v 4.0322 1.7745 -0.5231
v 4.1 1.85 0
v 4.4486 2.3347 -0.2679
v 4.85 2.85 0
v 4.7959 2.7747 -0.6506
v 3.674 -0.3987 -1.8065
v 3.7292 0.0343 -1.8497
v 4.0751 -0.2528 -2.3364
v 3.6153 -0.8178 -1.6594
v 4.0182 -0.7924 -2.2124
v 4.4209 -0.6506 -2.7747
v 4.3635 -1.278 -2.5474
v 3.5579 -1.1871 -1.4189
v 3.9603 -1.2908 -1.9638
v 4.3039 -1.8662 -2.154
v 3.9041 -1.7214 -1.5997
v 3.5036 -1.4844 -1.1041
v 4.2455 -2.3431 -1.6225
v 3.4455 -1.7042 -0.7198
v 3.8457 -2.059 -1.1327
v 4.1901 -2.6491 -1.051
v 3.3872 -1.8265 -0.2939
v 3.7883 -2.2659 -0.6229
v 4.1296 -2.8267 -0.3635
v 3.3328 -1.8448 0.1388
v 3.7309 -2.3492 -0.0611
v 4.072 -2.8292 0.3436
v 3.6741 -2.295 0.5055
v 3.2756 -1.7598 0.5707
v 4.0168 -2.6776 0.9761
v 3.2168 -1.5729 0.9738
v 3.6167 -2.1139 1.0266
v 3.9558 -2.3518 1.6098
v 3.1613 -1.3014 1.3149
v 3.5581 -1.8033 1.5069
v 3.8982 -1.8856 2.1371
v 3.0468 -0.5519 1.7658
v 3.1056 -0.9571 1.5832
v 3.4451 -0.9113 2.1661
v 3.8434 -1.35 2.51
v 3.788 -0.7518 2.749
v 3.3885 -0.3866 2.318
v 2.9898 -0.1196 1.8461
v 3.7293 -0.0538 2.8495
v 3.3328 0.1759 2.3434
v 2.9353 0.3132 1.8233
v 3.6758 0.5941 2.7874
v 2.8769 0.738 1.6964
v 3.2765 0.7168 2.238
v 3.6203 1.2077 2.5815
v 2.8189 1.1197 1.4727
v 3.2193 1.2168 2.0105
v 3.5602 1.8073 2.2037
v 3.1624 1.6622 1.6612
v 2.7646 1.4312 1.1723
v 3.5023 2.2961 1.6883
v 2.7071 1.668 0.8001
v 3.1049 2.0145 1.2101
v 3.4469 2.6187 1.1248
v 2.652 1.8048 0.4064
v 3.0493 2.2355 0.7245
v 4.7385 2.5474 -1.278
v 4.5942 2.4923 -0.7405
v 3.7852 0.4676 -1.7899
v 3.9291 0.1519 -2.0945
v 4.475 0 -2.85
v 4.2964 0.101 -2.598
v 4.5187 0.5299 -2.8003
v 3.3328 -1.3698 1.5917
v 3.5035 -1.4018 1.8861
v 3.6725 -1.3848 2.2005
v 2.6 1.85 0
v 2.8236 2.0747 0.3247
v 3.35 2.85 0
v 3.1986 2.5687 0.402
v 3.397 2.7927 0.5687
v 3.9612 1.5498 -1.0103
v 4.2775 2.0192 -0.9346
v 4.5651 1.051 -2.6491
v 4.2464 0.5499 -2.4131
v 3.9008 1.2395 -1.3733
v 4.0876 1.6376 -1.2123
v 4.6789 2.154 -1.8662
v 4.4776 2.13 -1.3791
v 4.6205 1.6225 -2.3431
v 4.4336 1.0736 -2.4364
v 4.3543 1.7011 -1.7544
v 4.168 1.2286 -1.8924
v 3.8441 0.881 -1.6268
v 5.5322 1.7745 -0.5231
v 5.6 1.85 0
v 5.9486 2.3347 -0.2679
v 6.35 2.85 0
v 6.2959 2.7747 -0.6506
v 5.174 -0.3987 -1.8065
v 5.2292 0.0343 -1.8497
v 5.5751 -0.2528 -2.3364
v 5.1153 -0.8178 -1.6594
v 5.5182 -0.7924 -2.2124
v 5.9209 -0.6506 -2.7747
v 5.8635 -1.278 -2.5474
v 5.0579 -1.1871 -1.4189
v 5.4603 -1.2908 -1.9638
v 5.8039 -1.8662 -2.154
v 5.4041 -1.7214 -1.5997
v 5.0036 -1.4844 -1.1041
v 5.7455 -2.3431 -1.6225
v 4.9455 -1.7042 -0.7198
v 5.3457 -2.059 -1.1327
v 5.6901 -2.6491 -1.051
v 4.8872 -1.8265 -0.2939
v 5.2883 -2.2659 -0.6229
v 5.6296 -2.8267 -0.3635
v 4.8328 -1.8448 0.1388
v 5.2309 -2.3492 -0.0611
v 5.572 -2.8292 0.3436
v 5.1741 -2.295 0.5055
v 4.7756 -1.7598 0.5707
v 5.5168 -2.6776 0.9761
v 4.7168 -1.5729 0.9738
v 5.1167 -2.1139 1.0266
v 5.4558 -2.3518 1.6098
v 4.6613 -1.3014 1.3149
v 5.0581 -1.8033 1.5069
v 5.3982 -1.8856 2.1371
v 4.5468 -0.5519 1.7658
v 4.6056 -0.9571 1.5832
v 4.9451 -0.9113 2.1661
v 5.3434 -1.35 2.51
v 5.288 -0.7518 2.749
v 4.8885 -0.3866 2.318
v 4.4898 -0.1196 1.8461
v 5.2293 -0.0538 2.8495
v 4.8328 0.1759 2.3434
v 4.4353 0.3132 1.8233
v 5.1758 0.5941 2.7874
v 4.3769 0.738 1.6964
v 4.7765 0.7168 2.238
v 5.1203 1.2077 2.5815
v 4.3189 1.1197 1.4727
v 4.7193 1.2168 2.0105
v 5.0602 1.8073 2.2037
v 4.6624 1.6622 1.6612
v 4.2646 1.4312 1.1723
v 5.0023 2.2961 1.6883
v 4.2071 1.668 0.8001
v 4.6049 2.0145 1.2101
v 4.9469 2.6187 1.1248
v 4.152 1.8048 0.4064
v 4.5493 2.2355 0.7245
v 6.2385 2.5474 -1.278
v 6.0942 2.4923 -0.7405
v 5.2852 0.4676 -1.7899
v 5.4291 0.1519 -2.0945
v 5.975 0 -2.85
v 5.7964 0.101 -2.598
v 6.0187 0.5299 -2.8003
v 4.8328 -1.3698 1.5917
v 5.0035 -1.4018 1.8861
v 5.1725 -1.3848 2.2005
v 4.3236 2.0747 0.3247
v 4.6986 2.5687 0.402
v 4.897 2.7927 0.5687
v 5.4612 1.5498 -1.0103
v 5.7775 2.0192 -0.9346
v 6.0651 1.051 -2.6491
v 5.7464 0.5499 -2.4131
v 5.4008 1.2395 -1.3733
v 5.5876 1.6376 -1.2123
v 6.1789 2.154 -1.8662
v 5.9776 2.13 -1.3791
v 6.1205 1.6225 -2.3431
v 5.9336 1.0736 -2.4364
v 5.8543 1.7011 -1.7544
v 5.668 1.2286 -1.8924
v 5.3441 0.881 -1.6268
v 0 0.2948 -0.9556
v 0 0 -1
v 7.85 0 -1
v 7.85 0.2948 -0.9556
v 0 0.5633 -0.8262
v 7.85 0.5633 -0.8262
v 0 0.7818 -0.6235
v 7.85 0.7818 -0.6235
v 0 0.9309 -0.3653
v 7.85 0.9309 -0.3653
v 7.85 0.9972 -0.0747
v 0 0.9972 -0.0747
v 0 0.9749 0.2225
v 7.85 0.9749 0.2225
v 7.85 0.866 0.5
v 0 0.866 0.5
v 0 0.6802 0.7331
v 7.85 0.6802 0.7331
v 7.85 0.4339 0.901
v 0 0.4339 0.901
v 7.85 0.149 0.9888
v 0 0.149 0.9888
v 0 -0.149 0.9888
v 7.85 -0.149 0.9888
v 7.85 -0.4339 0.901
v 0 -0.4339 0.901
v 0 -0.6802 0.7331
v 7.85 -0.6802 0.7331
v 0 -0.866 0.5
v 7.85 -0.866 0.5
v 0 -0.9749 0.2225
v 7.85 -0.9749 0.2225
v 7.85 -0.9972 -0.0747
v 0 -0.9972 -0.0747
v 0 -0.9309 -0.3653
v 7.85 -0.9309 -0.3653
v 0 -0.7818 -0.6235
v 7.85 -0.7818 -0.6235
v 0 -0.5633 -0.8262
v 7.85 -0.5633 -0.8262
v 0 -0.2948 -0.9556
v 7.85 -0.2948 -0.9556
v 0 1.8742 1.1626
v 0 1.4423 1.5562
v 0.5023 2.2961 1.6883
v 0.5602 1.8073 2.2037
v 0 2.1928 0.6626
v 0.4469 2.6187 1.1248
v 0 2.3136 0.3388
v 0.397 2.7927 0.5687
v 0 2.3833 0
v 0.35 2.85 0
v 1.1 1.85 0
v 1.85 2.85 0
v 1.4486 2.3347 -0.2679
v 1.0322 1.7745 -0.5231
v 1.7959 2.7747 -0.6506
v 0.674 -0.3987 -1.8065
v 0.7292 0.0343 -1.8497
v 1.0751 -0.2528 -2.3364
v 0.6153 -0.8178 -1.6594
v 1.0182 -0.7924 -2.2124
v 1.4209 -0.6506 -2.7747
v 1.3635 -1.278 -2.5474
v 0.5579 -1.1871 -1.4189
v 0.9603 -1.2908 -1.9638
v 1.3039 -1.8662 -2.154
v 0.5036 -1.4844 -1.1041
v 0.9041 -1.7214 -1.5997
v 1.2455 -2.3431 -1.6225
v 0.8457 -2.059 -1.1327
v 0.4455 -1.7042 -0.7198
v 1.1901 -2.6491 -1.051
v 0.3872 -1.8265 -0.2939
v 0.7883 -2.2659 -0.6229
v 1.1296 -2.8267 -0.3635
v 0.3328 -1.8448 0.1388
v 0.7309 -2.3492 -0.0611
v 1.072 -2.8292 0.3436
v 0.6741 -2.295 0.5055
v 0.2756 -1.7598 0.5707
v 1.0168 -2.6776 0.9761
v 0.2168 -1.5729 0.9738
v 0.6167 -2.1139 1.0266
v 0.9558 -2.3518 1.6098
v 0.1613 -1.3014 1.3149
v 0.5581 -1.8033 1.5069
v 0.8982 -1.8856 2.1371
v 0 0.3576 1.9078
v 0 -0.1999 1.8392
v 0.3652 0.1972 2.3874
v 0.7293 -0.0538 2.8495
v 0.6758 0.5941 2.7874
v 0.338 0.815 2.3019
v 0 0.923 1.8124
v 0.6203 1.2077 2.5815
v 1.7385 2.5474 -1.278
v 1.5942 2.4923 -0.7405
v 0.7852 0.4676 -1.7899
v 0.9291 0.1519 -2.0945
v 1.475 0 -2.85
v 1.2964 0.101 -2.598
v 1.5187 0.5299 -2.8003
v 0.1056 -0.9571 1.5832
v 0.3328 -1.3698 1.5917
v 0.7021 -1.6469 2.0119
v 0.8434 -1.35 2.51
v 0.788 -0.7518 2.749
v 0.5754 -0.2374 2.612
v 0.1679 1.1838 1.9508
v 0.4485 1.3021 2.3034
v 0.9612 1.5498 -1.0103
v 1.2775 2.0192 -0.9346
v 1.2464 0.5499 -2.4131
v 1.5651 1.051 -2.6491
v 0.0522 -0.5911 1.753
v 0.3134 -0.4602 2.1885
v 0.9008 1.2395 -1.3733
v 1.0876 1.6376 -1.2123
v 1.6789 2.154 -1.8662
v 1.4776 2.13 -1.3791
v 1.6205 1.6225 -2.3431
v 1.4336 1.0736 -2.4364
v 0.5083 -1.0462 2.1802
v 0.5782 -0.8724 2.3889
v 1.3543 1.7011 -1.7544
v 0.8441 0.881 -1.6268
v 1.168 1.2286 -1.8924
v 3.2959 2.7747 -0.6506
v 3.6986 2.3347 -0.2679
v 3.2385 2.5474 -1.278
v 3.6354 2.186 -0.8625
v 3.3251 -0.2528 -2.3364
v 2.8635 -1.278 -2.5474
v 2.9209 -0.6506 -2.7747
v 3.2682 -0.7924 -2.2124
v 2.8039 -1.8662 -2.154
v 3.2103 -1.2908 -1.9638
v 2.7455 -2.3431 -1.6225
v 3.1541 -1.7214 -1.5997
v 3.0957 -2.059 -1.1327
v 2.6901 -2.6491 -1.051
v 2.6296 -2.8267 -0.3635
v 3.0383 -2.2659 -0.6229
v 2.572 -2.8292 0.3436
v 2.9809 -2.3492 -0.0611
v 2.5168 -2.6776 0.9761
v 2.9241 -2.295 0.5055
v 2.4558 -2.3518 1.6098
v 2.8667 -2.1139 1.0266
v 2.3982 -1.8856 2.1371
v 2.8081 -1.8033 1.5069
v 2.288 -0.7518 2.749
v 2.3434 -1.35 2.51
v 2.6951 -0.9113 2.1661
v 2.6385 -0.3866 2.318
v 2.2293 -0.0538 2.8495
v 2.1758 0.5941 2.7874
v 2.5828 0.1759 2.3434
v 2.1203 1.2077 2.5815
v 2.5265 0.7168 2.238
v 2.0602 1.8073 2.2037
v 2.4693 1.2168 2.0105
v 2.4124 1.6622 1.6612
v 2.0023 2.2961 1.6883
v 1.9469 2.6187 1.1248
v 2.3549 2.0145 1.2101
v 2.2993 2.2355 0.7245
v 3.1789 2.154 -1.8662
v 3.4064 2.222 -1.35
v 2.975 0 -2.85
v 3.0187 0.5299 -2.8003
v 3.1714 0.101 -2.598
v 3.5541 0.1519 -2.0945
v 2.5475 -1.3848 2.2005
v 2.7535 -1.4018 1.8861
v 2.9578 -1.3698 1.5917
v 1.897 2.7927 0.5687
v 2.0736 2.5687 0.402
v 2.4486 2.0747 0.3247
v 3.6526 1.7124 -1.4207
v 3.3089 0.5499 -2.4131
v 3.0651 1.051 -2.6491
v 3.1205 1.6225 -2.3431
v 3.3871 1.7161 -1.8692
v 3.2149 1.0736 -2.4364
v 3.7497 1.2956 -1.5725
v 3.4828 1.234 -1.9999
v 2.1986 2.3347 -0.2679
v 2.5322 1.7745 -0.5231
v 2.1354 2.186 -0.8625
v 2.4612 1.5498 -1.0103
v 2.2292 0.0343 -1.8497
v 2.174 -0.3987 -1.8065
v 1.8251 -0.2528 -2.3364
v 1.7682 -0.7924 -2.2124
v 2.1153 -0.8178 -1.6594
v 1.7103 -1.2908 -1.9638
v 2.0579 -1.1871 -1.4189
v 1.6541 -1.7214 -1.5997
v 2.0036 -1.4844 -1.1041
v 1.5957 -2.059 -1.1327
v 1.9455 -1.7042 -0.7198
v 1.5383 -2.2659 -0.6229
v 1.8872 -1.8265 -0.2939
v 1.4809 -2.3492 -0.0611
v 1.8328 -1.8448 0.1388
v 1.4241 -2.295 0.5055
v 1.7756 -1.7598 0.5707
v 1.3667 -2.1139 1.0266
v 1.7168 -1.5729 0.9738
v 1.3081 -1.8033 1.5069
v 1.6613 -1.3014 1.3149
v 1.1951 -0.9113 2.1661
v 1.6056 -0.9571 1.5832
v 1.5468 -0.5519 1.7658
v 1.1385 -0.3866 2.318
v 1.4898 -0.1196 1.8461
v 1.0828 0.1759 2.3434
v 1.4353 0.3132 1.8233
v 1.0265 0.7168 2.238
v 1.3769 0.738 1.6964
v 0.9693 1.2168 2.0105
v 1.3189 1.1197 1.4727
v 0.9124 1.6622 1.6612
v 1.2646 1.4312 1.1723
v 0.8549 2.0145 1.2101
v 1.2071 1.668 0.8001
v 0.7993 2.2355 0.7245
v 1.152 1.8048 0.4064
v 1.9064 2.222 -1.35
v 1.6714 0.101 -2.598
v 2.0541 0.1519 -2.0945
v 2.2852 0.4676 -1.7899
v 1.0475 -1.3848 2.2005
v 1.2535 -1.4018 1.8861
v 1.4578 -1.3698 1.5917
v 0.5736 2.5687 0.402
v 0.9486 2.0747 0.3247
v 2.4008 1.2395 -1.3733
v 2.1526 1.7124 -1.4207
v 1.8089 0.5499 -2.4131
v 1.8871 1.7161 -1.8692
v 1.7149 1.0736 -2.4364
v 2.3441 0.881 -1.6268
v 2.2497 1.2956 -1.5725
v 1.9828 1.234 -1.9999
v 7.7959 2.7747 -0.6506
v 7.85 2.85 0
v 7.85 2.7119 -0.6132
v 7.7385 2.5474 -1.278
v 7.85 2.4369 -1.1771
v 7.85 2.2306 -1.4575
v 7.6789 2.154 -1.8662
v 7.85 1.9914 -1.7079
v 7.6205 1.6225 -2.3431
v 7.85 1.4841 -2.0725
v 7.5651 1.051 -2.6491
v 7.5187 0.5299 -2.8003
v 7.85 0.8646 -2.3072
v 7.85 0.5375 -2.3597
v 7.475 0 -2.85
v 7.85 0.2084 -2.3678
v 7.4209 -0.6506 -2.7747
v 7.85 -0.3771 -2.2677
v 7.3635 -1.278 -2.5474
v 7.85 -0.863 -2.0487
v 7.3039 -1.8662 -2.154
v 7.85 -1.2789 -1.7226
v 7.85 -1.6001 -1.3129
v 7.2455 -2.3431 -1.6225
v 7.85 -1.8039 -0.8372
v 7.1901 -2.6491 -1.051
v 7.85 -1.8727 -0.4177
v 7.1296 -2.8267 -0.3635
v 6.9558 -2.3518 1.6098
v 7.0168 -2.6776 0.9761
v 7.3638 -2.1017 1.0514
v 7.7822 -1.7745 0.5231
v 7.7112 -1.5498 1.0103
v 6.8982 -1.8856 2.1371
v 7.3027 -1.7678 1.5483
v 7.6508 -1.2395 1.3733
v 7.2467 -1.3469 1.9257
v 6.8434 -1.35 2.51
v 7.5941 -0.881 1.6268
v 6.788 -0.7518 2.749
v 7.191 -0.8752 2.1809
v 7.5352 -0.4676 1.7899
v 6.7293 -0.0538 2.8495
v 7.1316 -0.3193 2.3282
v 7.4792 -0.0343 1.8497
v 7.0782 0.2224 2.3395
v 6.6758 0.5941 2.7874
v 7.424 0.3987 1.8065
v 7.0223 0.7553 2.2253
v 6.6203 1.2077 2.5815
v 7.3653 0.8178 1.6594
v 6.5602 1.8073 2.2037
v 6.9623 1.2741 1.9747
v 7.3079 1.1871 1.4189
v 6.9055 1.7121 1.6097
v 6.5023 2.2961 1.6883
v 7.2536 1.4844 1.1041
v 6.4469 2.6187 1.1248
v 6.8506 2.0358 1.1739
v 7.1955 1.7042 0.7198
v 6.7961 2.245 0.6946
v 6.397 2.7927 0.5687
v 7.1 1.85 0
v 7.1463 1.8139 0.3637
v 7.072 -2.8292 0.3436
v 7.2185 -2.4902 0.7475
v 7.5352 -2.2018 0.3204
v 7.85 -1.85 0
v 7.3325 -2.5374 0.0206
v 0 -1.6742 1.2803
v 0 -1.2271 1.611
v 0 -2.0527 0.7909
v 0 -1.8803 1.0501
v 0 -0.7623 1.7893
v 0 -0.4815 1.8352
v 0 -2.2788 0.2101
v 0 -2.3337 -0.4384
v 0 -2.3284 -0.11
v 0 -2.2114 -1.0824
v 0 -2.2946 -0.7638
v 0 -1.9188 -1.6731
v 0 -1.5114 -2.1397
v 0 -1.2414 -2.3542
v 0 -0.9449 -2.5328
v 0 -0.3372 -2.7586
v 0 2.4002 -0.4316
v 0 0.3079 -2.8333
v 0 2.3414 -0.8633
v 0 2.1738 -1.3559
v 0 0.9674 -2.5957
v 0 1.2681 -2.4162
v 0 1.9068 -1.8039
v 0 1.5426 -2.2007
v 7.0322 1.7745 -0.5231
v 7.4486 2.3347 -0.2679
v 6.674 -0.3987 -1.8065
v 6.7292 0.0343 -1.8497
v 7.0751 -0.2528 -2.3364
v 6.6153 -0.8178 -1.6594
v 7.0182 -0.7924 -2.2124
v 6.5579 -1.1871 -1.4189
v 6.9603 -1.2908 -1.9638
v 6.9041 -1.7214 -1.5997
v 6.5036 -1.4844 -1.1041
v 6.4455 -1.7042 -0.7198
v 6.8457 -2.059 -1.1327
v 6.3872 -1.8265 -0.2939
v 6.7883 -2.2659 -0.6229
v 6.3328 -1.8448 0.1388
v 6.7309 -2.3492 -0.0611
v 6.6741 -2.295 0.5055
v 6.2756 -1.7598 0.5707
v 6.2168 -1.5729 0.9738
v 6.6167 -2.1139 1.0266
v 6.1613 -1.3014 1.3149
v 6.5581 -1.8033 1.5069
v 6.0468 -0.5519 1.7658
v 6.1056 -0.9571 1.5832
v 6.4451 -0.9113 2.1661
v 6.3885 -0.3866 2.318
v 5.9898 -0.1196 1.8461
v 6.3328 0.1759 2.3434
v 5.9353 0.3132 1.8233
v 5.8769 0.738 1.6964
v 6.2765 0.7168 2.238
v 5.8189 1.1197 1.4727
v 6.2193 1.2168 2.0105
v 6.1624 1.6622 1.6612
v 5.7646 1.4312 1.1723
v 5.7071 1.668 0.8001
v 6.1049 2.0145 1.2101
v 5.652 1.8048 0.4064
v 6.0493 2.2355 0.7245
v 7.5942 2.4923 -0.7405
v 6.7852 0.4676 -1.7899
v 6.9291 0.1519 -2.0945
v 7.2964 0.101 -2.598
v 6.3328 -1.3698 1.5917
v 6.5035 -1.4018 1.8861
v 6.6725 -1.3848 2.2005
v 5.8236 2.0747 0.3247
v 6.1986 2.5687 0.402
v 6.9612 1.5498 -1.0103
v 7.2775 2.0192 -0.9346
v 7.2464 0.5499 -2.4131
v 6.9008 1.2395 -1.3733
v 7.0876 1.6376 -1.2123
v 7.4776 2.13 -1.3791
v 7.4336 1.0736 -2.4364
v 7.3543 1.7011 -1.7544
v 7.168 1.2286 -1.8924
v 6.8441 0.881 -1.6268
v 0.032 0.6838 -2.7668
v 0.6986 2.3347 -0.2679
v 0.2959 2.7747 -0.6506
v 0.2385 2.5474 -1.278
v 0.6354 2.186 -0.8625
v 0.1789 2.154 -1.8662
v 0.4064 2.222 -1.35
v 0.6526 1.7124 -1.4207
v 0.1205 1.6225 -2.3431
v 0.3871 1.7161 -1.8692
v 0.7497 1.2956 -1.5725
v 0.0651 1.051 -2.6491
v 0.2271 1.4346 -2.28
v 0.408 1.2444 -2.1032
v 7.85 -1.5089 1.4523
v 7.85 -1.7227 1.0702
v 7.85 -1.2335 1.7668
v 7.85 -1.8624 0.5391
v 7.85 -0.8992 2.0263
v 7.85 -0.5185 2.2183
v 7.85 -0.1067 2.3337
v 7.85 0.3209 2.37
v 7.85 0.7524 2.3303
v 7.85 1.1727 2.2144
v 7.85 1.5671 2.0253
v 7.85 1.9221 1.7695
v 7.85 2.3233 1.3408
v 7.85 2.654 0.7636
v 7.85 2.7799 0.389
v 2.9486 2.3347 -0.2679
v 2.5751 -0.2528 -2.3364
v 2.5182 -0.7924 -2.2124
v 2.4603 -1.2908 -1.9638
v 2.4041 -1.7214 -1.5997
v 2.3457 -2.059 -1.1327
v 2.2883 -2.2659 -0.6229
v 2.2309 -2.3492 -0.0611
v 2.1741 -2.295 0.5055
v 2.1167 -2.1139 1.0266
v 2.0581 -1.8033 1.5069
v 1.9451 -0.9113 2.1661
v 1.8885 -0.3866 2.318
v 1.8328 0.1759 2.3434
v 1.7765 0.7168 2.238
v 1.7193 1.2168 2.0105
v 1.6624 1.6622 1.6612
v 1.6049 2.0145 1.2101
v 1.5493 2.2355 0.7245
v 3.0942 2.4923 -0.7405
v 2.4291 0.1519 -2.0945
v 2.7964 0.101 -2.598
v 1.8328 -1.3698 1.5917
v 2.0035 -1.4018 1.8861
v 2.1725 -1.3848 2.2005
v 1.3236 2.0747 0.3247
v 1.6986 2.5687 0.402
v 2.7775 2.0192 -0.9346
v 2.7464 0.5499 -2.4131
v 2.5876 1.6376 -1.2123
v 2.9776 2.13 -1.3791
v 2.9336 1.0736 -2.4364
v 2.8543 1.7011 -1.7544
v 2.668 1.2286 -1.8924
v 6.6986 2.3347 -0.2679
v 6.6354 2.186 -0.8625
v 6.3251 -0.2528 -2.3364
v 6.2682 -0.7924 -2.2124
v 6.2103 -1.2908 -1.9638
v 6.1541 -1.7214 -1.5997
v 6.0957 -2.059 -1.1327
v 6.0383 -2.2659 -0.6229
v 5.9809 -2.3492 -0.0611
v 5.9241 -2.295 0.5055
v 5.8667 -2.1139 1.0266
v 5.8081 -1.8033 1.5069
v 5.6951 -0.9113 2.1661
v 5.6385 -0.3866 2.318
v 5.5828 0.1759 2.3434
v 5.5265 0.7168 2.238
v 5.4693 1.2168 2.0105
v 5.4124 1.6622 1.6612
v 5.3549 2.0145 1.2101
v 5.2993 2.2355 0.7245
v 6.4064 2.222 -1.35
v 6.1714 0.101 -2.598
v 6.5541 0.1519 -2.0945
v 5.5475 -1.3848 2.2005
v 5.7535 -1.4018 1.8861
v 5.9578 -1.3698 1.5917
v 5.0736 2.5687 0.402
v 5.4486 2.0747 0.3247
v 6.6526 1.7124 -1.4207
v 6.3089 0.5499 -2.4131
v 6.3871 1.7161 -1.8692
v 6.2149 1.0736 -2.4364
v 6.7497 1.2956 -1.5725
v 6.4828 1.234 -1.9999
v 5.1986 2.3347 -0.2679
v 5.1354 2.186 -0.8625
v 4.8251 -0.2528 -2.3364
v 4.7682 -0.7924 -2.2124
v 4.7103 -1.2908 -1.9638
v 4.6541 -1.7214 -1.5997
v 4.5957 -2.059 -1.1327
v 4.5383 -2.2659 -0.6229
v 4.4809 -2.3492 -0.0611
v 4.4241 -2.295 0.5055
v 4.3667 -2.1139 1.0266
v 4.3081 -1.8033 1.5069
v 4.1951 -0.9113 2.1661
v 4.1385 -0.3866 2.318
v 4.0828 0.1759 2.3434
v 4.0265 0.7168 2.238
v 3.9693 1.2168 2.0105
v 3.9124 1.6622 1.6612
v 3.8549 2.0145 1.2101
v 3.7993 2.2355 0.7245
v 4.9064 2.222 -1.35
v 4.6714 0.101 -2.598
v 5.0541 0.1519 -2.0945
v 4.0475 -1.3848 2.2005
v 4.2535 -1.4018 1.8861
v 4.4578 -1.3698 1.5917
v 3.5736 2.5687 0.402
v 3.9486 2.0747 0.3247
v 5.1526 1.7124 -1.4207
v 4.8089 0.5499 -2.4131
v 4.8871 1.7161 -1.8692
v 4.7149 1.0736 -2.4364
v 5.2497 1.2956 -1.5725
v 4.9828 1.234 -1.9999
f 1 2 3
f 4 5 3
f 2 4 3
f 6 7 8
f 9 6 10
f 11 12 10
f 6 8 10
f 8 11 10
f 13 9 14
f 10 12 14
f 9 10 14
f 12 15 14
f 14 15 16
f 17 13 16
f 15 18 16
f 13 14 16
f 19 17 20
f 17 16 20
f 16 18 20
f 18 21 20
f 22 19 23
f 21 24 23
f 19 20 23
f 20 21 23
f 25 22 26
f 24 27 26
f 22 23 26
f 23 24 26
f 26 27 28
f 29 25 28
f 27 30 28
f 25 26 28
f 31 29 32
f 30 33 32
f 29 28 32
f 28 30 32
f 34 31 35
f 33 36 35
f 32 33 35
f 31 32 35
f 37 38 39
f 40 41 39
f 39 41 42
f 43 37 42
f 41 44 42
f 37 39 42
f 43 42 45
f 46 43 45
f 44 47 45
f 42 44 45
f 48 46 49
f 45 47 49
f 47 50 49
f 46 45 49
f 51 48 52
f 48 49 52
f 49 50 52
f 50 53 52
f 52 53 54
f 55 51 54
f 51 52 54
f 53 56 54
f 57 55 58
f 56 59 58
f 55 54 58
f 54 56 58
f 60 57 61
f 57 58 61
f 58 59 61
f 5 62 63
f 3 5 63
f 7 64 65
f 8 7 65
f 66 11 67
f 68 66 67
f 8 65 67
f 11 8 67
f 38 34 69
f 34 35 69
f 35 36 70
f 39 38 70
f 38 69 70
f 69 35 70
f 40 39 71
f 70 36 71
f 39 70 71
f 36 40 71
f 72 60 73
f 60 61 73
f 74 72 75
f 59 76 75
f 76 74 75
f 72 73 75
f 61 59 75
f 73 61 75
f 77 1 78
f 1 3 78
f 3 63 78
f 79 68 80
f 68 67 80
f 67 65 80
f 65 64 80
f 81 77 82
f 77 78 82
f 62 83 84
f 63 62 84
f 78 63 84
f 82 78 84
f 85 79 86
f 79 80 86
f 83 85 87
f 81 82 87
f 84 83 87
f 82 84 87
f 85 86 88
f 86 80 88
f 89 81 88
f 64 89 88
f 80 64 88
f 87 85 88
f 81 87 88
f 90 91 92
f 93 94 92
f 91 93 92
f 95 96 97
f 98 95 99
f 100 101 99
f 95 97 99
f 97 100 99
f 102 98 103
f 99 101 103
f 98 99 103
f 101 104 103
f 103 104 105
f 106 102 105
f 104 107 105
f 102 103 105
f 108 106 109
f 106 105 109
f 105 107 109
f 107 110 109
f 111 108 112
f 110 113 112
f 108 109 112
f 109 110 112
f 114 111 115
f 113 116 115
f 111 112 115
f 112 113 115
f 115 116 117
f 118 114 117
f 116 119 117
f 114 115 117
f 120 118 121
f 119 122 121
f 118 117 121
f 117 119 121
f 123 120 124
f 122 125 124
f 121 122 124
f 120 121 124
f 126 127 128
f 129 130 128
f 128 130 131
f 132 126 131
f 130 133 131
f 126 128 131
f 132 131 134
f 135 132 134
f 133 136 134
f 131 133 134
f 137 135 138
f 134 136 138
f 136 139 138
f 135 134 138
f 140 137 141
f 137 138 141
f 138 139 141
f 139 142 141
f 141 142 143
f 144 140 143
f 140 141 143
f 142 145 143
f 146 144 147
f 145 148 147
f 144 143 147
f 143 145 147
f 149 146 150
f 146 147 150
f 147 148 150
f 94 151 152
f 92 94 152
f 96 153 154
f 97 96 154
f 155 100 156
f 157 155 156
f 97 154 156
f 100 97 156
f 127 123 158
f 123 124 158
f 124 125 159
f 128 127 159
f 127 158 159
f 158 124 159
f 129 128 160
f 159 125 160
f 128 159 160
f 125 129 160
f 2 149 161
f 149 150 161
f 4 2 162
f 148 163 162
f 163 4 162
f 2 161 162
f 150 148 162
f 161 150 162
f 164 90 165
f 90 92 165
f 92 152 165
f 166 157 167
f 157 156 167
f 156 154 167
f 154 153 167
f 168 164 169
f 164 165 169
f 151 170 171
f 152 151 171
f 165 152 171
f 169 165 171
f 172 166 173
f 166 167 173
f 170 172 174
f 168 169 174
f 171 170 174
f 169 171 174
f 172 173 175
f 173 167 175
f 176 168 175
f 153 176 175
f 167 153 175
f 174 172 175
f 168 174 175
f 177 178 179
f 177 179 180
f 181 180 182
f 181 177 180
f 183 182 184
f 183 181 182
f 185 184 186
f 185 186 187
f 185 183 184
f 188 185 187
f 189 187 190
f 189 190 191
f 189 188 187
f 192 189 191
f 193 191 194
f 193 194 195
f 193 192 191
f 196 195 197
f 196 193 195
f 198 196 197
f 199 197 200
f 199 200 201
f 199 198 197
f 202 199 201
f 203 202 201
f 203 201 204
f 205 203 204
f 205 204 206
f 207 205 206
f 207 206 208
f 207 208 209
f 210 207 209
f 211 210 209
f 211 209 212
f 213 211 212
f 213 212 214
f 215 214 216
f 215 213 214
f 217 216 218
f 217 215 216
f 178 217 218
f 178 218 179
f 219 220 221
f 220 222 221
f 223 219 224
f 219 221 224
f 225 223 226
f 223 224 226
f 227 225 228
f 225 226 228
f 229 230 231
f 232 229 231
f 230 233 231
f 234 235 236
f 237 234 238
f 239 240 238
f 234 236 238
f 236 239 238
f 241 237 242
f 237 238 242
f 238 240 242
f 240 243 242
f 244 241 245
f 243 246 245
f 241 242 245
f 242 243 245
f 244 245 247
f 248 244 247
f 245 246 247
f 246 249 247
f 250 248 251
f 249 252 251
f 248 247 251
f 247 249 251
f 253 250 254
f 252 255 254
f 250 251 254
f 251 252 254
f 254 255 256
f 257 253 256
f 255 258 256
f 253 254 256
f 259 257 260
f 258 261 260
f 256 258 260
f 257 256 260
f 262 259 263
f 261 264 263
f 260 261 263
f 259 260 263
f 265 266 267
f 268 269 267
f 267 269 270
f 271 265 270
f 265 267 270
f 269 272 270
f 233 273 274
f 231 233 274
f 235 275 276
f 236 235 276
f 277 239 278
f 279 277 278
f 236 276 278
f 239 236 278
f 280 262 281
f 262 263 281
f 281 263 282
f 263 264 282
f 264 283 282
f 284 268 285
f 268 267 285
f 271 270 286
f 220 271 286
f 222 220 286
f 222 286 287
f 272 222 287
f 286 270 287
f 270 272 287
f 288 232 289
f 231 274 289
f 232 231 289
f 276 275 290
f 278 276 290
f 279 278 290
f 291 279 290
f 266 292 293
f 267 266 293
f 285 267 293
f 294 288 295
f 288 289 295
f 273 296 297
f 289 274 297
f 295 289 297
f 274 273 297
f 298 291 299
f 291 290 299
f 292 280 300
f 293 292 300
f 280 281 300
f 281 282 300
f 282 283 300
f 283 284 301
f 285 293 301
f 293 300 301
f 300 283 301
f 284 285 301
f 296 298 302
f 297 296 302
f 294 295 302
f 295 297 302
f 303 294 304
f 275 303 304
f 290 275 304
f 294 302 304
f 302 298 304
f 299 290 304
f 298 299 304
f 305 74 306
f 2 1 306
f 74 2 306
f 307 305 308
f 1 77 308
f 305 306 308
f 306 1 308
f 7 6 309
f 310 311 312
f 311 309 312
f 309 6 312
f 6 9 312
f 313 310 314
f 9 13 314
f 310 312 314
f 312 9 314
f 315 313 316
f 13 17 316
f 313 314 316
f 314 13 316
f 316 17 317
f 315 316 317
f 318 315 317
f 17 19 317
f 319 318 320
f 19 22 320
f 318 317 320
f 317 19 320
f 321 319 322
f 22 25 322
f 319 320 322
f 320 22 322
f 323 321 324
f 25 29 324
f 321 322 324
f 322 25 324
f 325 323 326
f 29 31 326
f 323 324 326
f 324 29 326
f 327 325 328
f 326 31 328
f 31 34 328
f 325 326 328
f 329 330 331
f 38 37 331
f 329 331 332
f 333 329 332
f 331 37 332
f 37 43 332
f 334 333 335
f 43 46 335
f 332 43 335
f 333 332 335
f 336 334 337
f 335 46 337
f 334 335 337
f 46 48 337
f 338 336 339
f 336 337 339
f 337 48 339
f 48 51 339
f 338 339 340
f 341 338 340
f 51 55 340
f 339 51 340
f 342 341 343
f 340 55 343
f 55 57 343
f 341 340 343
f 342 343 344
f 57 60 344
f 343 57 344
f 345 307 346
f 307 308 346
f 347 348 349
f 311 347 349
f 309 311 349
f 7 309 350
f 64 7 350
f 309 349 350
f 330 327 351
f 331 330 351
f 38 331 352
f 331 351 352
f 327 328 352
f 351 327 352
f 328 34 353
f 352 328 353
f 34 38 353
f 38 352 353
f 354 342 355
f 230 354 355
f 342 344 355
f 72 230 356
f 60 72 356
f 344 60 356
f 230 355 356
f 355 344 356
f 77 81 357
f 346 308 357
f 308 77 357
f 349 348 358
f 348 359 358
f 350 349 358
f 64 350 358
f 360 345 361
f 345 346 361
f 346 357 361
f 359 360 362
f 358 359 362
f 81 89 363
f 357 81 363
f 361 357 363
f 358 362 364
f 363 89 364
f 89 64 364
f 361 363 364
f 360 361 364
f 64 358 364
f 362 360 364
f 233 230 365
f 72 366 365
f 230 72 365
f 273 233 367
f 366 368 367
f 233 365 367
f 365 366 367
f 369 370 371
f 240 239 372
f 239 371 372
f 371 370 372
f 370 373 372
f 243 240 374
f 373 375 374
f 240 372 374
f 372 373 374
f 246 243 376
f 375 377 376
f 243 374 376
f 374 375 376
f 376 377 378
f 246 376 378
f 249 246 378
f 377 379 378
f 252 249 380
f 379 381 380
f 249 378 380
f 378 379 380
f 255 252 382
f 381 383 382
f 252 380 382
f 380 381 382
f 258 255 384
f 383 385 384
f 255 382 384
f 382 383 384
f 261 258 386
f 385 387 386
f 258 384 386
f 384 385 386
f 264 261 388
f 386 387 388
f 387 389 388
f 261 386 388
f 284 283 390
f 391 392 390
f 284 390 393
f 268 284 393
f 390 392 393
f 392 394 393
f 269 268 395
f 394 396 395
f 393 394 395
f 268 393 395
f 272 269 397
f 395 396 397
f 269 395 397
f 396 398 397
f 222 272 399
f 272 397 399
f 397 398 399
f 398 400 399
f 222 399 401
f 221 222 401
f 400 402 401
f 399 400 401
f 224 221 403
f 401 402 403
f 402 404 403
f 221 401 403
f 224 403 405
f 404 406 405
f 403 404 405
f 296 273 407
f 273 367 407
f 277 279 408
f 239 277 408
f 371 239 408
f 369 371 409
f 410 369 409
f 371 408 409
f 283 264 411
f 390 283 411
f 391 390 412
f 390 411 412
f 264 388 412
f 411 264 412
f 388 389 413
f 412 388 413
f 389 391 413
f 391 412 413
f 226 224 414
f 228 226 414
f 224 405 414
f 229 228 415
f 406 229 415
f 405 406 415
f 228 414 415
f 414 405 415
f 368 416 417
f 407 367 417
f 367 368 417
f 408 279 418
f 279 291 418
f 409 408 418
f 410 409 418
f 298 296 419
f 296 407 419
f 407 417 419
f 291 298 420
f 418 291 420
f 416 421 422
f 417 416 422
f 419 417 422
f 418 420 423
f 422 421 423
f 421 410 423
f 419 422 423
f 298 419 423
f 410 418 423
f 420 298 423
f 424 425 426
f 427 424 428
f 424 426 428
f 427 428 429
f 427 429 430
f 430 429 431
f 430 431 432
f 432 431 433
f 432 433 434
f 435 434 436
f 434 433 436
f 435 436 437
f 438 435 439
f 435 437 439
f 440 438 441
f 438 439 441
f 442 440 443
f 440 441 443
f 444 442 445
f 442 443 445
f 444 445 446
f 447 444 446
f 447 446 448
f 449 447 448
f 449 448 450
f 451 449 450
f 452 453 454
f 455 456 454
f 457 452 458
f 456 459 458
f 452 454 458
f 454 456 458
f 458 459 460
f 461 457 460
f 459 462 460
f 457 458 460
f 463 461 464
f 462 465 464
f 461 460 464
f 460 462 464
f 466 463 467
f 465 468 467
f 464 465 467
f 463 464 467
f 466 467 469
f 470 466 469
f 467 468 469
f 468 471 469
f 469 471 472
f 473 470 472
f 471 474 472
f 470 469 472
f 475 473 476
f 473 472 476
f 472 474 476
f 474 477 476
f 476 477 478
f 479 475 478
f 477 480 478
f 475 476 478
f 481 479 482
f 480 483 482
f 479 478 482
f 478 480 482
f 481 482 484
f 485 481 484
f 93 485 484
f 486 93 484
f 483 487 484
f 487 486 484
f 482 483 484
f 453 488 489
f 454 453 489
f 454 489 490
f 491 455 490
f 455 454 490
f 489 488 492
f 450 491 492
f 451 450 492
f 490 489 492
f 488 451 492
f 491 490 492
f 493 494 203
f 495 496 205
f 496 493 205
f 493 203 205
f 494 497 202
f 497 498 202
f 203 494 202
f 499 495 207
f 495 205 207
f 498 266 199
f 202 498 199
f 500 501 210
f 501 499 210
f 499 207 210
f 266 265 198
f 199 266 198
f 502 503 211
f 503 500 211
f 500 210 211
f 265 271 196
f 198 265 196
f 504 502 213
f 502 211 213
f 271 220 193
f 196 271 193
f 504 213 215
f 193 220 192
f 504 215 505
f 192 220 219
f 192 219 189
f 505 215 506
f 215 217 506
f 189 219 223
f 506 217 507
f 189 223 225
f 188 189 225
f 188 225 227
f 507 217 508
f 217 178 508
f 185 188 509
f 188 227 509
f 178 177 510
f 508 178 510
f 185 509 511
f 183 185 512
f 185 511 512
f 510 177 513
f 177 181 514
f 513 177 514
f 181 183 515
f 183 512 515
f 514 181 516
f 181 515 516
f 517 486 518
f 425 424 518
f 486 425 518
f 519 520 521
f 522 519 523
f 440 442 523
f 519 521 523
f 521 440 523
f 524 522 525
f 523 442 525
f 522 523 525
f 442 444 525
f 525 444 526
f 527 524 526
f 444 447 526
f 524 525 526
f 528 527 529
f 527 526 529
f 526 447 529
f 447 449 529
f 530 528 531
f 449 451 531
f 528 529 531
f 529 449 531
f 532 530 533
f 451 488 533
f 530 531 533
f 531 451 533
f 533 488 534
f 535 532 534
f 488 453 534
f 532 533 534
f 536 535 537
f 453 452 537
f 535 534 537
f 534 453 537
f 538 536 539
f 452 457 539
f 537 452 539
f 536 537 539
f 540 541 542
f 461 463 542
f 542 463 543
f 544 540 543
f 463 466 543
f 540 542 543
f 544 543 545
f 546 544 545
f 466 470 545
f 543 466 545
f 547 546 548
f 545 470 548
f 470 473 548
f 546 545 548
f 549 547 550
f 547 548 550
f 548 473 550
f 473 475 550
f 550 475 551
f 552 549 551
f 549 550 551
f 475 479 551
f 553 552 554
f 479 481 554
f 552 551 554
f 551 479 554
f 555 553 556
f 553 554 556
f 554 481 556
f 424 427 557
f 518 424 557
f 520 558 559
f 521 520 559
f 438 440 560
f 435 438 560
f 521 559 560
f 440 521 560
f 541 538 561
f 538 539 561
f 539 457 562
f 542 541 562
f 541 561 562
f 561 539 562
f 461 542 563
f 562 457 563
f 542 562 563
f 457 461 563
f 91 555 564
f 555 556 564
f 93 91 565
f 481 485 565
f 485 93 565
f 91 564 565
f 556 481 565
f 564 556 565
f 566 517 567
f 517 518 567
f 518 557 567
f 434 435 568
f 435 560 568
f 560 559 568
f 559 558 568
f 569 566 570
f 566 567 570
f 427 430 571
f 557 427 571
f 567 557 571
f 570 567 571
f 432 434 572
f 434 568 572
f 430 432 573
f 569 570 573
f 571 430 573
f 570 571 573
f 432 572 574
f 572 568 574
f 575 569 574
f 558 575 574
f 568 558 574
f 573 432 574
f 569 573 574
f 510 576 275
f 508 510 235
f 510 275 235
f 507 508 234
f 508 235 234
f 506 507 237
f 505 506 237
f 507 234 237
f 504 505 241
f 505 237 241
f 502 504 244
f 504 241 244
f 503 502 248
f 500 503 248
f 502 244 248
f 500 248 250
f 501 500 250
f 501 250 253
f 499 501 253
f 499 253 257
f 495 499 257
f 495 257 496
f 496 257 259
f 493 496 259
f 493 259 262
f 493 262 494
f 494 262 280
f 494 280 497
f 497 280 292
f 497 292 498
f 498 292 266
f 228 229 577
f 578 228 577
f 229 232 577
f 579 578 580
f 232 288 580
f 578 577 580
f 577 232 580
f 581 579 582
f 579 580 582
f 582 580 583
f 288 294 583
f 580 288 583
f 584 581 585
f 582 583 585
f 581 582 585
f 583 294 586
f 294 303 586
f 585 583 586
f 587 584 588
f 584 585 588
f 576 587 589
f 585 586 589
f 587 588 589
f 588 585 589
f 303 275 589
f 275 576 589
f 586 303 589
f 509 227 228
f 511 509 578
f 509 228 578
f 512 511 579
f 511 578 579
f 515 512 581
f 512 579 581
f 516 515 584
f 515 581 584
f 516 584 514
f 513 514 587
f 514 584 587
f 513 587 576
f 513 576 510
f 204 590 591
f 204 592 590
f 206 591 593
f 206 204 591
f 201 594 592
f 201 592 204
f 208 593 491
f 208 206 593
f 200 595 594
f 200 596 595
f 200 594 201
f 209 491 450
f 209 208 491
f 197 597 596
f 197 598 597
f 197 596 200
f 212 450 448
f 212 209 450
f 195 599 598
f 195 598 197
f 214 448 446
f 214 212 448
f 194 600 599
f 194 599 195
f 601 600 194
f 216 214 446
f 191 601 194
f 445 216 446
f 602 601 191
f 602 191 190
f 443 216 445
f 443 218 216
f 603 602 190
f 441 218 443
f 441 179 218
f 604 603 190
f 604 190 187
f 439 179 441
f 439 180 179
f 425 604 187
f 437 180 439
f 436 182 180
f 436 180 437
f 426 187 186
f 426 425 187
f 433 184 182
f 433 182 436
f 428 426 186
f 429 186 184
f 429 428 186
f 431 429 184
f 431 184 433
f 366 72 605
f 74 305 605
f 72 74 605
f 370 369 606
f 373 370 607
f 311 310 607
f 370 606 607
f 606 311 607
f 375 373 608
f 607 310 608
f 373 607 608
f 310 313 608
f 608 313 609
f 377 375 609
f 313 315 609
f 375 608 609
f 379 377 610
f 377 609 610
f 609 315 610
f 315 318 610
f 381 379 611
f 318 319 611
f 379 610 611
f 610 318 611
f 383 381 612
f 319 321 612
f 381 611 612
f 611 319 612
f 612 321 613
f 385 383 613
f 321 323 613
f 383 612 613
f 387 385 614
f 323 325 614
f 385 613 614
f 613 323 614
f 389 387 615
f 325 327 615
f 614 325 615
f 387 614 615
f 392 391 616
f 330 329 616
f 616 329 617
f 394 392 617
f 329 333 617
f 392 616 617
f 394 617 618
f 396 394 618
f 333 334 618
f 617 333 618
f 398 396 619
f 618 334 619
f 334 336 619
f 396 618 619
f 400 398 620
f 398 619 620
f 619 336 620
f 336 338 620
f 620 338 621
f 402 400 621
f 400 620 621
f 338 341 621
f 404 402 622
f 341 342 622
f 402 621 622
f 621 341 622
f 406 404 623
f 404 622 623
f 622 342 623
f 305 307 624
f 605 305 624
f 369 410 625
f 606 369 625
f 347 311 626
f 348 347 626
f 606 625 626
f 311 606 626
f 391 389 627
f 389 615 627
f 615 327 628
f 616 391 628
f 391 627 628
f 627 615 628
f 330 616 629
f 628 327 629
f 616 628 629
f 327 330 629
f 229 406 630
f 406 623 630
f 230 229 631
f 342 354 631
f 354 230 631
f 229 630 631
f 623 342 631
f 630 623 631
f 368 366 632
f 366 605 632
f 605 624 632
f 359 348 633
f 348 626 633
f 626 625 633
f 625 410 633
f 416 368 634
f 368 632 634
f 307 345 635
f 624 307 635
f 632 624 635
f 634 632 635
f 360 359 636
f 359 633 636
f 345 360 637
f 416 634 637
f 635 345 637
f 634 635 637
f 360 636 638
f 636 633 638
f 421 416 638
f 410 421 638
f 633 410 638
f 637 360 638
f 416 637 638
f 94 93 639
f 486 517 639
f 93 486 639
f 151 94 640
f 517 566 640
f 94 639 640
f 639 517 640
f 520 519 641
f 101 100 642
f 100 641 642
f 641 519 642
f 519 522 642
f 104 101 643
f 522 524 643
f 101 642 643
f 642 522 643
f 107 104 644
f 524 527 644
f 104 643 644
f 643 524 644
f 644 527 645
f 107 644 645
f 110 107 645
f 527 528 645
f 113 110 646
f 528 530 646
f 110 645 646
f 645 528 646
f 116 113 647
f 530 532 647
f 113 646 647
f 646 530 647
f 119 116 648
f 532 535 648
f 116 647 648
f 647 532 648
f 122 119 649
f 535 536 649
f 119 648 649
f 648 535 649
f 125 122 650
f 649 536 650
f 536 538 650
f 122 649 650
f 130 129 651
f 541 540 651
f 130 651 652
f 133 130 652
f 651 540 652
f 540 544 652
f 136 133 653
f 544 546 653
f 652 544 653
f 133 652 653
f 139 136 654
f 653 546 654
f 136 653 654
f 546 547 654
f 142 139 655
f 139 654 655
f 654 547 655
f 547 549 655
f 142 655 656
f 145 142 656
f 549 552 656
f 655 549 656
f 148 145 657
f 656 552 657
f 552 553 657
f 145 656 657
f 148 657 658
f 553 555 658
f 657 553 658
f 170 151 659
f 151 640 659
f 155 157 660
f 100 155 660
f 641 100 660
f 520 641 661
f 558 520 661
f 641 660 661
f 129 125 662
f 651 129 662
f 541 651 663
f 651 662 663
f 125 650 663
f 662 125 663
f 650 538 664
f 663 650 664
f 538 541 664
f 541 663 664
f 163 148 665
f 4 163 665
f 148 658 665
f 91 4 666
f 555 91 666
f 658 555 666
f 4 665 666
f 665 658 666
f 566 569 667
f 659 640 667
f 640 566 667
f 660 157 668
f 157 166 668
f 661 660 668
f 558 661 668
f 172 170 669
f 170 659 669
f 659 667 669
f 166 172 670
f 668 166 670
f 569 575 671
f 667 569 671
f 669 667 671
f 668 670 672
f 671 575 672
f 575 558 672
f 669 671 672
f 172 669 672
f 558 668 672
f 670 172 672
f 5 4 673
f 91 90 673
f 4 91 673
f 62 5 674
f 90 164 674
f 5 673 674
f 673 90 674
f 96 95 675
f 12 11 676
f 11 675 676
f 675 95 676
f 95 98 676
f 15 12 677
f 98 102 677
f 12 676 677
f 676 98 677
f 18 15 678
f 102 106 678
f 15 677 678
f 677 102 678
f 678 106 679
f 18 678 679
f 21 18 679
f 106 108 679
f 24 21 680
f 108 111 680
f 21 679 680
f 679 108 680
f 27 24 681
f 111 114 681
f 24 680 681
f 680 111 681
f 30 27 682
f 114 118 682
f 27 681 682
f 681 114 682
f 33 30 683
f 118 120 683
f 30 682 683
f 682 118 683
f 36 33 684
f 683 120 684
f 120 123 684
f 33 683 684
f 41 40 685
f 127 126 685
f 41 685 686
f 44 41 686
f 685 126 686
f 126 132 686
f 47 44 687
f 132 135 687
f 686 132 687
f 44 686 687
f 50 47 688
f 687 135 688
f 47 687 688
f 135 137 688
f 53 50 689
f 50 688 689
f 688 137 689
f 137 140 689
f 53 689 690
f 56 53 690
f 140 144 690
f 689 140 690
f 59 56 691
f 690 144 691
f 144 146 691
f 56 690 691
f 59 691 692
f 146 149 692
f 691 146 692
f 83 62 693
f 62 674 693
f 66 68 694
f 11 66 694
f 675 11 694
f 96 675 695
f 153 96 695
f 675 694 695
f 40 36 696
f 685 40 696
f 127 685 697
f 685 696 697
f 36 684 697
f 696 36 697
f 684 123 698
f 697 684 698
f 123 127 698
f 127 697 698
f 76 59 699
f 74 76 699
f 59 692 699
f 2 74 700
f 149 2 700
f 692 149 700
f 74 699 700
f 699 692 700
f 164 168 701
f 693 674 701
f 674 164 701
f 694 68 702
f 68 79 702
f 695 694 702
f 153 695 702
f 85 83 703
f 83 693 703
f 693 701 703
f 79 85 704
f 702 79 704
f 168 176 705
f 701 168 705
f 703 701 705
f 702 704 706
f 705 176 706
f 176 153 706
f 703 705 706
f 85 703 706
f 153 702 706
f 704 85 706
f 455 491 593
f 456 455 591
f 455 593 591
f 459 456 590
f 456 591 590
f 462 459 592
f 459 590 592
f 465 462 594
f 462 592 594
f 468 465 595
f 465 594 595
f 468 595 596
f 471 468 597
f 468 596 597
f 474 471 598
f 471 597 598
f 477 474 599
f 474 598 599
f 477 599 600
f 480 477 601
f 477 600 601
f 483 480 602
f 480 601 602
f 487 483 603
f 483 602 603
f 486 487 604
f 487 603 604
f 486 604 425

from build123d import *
from build123d.topology import SkipClean

# Parameters (mm, degrees)
SKETCH1_R           = 2.85
SKETCH1_R_2         = 1
BOSS_EXTRUDE1_DEPTH = 7.85
CUT_SWEEP3_PITCH    = 1.5


with BuildPart() as part:
    # Sketch1 → Boss-Extrude1 (new body)
    with BuildSketch(Plane(origin=(0, 0, 0), x_dir=(0, 0, -1), z_dir=(1, 0, 0))):
        Circle(SKETCH1_R)
        Circle(SKETCH1_R_2, mode=Mode.SUBTRACT)
    extrude(amount=BOSS_EXTRUDE1_DEPTH)

    # Cut-Sweep3: the profile of Sketch3 screwed along a right-hand helix of 6.5 turns, 8 arcs to a turn; built about Z, then put on its axis
    with SkipClean():  # the faces are left unmerged after this step: merging them gives an invalid solid
        cut_sweep3_z = Axis((0, 0, 0), (0, 0, 1))
        cut_sweep3_corners = [(2.85, 0, 0), (1.85, 0, -0.75), (2.85, 0, -1.5), (3.101496865, 0, -1.5), (3.101496865, 0, 0)]
        with BuildLine(mode=Mode.PRIVATE) as cut_sweep3_profile:
            Line(cut_sweep3_corners[0], cut_sweep3_corners[1])
            Line(cut_sweep3_corners[1], cut_sweep3_corners[2])
            Line(cut_sweep3_corners[2], cut_sweep3_corners[3])
            Line(cut_sweep3_corners[3], cut_sweep3_corners[4])
            Line(cut_sweep3_corners[4], cut_sweep3_corners[0])
        cut_sweep3_cap = Face(cut_sweep3_profile.wire())
        cut_sweep3_turn_angles = [0, 22.5, 45, 67.5, 90, 112.5, 135, 157.5, 180, 202.5, 225, 247.5, 270, 292.5, 315, 337.5, 360]
        cut_sweep3_turn_weights = [1, 0.9238795325112867, 1, 0.9238795325112867, 1, 0.9238795325112867, 1, 0.9238795325112867, 1, 0.9238795325112867, 1, 0.9238795325112867, 1, 0.9238795325112867, 1, 0.9238795325112867, 1]
        cut_sweep3_turn_rails = [Edge.make_bspline([Vector(p[0], p[1], 0).rotate(cut_sweep3_z, cut_sweep3_turn_angles[k]) / cut_sweep3_turn_weights[k] + Vector(0, 0, p[2] + CUT_SWEEP3_PITCH * cut_sweep3_turn_angles[k] / 360) for k in range(17)], [0, 0, 0, 1, 1, 2, 2, 3, 3, 4, 4, 5, 5, 6, 6, 7, 7, 8, 8, 8], 2, cut_sweep3_turn_weights) for p in cut_sweep3_corners]
        cut_sweep3_turn_sides = [Face.make_surface_from_curves(cut_sweep3_turn_rails[p[0]], cut_sweep3_turn_rails[p[1]]) for p in [(0, 1), (1, 2), (2, 3), (3, 4), (4, 0)]]
        cut_sweep3_turn = Solid(Shell([*cut_sweep3_turn_sides, cut_sweep3_cap, cut_sweep3_cap.rotate(cut_sweep3_z, 360).moved(Location((0, 0, CUT_SWEEP3_PITCH * 360 / 360)))]))
        cut_sweep3_last_angles = [2160, 2182.5, 2205, 2227.5, 2250, 2272.5, 2295, 2317.5, 2340]
        cut_sweep3_last_weights = [1, 0.9238795325112867, 1, 0.9238795325112867, 1, 0.9238795325112867, 1, 0.9238795325112442, 1]
        cut_sweep3_last_rails = [Edge.make_bspline([Vector(p[0], p[1], 0).rotate(cut_sweep3_z, cut_sweep3_last_angles[k]) / cut_sweep3_last_weights[k] + Vector(0, 0, p[2] + CUT_SWEEP3_PITCH * cut_sweep3_last_angles[k] / 360) for k in range(9)], [0, 0, 0, 1, 1, 2, 2, 3, 3, 4, 4, 4], 2, cut_sweep3_last_weights) for p in cut_sweep3_corners]
        cut_sweep3_last_sides = [Face.make_surface_from_curves(cut_sweep3_last_rails[p[0]], cut_sweep3_last_rails[p[1]]) for p in [(0, 1), (1, 2), (2, 3), (3, 4), (4, 0)]]
        cut_sweep3_last = Solid(Shell([*cut_sweep3_last_sides, cut_sweep3_cap.rotate(cut_sweep3_z, 2160).moved(Location((0, 0, CUT_SWEEP3_PITCH * 2160 / 360))), cut_sweep3_cap.rotate(cut_sweep3_z, 2340).moved(Location((0, 0, CUT_SWEEP3_PITCH * 2340 / 360)))]))
        cut_sweep3_each = [*[cut_sweep3_turn.moved(Location((0, 0, CUT_SWEEP3_PITCH * i))) for i in range(6)], cut_sweep3_last]
        add(Plane(origin=(7.85, 0, 0), x_dir=(0, 1, 0), z_dir=(-1, 0, 0)) * Compound([cut_sweep3_each[i] for i in range(0, 7, 2)]), mode=Mode.SUBTRACT)
        add(Plane(origin=(7.85, 0, 0), x_dir=(0, 1, 0), z_dir=(-1, 0, 0)) * Compound([cut_sweep3_each[i] for i in range(1, 7, 2)]), mode=Mode.SUBTRACT)


solid = part.part
